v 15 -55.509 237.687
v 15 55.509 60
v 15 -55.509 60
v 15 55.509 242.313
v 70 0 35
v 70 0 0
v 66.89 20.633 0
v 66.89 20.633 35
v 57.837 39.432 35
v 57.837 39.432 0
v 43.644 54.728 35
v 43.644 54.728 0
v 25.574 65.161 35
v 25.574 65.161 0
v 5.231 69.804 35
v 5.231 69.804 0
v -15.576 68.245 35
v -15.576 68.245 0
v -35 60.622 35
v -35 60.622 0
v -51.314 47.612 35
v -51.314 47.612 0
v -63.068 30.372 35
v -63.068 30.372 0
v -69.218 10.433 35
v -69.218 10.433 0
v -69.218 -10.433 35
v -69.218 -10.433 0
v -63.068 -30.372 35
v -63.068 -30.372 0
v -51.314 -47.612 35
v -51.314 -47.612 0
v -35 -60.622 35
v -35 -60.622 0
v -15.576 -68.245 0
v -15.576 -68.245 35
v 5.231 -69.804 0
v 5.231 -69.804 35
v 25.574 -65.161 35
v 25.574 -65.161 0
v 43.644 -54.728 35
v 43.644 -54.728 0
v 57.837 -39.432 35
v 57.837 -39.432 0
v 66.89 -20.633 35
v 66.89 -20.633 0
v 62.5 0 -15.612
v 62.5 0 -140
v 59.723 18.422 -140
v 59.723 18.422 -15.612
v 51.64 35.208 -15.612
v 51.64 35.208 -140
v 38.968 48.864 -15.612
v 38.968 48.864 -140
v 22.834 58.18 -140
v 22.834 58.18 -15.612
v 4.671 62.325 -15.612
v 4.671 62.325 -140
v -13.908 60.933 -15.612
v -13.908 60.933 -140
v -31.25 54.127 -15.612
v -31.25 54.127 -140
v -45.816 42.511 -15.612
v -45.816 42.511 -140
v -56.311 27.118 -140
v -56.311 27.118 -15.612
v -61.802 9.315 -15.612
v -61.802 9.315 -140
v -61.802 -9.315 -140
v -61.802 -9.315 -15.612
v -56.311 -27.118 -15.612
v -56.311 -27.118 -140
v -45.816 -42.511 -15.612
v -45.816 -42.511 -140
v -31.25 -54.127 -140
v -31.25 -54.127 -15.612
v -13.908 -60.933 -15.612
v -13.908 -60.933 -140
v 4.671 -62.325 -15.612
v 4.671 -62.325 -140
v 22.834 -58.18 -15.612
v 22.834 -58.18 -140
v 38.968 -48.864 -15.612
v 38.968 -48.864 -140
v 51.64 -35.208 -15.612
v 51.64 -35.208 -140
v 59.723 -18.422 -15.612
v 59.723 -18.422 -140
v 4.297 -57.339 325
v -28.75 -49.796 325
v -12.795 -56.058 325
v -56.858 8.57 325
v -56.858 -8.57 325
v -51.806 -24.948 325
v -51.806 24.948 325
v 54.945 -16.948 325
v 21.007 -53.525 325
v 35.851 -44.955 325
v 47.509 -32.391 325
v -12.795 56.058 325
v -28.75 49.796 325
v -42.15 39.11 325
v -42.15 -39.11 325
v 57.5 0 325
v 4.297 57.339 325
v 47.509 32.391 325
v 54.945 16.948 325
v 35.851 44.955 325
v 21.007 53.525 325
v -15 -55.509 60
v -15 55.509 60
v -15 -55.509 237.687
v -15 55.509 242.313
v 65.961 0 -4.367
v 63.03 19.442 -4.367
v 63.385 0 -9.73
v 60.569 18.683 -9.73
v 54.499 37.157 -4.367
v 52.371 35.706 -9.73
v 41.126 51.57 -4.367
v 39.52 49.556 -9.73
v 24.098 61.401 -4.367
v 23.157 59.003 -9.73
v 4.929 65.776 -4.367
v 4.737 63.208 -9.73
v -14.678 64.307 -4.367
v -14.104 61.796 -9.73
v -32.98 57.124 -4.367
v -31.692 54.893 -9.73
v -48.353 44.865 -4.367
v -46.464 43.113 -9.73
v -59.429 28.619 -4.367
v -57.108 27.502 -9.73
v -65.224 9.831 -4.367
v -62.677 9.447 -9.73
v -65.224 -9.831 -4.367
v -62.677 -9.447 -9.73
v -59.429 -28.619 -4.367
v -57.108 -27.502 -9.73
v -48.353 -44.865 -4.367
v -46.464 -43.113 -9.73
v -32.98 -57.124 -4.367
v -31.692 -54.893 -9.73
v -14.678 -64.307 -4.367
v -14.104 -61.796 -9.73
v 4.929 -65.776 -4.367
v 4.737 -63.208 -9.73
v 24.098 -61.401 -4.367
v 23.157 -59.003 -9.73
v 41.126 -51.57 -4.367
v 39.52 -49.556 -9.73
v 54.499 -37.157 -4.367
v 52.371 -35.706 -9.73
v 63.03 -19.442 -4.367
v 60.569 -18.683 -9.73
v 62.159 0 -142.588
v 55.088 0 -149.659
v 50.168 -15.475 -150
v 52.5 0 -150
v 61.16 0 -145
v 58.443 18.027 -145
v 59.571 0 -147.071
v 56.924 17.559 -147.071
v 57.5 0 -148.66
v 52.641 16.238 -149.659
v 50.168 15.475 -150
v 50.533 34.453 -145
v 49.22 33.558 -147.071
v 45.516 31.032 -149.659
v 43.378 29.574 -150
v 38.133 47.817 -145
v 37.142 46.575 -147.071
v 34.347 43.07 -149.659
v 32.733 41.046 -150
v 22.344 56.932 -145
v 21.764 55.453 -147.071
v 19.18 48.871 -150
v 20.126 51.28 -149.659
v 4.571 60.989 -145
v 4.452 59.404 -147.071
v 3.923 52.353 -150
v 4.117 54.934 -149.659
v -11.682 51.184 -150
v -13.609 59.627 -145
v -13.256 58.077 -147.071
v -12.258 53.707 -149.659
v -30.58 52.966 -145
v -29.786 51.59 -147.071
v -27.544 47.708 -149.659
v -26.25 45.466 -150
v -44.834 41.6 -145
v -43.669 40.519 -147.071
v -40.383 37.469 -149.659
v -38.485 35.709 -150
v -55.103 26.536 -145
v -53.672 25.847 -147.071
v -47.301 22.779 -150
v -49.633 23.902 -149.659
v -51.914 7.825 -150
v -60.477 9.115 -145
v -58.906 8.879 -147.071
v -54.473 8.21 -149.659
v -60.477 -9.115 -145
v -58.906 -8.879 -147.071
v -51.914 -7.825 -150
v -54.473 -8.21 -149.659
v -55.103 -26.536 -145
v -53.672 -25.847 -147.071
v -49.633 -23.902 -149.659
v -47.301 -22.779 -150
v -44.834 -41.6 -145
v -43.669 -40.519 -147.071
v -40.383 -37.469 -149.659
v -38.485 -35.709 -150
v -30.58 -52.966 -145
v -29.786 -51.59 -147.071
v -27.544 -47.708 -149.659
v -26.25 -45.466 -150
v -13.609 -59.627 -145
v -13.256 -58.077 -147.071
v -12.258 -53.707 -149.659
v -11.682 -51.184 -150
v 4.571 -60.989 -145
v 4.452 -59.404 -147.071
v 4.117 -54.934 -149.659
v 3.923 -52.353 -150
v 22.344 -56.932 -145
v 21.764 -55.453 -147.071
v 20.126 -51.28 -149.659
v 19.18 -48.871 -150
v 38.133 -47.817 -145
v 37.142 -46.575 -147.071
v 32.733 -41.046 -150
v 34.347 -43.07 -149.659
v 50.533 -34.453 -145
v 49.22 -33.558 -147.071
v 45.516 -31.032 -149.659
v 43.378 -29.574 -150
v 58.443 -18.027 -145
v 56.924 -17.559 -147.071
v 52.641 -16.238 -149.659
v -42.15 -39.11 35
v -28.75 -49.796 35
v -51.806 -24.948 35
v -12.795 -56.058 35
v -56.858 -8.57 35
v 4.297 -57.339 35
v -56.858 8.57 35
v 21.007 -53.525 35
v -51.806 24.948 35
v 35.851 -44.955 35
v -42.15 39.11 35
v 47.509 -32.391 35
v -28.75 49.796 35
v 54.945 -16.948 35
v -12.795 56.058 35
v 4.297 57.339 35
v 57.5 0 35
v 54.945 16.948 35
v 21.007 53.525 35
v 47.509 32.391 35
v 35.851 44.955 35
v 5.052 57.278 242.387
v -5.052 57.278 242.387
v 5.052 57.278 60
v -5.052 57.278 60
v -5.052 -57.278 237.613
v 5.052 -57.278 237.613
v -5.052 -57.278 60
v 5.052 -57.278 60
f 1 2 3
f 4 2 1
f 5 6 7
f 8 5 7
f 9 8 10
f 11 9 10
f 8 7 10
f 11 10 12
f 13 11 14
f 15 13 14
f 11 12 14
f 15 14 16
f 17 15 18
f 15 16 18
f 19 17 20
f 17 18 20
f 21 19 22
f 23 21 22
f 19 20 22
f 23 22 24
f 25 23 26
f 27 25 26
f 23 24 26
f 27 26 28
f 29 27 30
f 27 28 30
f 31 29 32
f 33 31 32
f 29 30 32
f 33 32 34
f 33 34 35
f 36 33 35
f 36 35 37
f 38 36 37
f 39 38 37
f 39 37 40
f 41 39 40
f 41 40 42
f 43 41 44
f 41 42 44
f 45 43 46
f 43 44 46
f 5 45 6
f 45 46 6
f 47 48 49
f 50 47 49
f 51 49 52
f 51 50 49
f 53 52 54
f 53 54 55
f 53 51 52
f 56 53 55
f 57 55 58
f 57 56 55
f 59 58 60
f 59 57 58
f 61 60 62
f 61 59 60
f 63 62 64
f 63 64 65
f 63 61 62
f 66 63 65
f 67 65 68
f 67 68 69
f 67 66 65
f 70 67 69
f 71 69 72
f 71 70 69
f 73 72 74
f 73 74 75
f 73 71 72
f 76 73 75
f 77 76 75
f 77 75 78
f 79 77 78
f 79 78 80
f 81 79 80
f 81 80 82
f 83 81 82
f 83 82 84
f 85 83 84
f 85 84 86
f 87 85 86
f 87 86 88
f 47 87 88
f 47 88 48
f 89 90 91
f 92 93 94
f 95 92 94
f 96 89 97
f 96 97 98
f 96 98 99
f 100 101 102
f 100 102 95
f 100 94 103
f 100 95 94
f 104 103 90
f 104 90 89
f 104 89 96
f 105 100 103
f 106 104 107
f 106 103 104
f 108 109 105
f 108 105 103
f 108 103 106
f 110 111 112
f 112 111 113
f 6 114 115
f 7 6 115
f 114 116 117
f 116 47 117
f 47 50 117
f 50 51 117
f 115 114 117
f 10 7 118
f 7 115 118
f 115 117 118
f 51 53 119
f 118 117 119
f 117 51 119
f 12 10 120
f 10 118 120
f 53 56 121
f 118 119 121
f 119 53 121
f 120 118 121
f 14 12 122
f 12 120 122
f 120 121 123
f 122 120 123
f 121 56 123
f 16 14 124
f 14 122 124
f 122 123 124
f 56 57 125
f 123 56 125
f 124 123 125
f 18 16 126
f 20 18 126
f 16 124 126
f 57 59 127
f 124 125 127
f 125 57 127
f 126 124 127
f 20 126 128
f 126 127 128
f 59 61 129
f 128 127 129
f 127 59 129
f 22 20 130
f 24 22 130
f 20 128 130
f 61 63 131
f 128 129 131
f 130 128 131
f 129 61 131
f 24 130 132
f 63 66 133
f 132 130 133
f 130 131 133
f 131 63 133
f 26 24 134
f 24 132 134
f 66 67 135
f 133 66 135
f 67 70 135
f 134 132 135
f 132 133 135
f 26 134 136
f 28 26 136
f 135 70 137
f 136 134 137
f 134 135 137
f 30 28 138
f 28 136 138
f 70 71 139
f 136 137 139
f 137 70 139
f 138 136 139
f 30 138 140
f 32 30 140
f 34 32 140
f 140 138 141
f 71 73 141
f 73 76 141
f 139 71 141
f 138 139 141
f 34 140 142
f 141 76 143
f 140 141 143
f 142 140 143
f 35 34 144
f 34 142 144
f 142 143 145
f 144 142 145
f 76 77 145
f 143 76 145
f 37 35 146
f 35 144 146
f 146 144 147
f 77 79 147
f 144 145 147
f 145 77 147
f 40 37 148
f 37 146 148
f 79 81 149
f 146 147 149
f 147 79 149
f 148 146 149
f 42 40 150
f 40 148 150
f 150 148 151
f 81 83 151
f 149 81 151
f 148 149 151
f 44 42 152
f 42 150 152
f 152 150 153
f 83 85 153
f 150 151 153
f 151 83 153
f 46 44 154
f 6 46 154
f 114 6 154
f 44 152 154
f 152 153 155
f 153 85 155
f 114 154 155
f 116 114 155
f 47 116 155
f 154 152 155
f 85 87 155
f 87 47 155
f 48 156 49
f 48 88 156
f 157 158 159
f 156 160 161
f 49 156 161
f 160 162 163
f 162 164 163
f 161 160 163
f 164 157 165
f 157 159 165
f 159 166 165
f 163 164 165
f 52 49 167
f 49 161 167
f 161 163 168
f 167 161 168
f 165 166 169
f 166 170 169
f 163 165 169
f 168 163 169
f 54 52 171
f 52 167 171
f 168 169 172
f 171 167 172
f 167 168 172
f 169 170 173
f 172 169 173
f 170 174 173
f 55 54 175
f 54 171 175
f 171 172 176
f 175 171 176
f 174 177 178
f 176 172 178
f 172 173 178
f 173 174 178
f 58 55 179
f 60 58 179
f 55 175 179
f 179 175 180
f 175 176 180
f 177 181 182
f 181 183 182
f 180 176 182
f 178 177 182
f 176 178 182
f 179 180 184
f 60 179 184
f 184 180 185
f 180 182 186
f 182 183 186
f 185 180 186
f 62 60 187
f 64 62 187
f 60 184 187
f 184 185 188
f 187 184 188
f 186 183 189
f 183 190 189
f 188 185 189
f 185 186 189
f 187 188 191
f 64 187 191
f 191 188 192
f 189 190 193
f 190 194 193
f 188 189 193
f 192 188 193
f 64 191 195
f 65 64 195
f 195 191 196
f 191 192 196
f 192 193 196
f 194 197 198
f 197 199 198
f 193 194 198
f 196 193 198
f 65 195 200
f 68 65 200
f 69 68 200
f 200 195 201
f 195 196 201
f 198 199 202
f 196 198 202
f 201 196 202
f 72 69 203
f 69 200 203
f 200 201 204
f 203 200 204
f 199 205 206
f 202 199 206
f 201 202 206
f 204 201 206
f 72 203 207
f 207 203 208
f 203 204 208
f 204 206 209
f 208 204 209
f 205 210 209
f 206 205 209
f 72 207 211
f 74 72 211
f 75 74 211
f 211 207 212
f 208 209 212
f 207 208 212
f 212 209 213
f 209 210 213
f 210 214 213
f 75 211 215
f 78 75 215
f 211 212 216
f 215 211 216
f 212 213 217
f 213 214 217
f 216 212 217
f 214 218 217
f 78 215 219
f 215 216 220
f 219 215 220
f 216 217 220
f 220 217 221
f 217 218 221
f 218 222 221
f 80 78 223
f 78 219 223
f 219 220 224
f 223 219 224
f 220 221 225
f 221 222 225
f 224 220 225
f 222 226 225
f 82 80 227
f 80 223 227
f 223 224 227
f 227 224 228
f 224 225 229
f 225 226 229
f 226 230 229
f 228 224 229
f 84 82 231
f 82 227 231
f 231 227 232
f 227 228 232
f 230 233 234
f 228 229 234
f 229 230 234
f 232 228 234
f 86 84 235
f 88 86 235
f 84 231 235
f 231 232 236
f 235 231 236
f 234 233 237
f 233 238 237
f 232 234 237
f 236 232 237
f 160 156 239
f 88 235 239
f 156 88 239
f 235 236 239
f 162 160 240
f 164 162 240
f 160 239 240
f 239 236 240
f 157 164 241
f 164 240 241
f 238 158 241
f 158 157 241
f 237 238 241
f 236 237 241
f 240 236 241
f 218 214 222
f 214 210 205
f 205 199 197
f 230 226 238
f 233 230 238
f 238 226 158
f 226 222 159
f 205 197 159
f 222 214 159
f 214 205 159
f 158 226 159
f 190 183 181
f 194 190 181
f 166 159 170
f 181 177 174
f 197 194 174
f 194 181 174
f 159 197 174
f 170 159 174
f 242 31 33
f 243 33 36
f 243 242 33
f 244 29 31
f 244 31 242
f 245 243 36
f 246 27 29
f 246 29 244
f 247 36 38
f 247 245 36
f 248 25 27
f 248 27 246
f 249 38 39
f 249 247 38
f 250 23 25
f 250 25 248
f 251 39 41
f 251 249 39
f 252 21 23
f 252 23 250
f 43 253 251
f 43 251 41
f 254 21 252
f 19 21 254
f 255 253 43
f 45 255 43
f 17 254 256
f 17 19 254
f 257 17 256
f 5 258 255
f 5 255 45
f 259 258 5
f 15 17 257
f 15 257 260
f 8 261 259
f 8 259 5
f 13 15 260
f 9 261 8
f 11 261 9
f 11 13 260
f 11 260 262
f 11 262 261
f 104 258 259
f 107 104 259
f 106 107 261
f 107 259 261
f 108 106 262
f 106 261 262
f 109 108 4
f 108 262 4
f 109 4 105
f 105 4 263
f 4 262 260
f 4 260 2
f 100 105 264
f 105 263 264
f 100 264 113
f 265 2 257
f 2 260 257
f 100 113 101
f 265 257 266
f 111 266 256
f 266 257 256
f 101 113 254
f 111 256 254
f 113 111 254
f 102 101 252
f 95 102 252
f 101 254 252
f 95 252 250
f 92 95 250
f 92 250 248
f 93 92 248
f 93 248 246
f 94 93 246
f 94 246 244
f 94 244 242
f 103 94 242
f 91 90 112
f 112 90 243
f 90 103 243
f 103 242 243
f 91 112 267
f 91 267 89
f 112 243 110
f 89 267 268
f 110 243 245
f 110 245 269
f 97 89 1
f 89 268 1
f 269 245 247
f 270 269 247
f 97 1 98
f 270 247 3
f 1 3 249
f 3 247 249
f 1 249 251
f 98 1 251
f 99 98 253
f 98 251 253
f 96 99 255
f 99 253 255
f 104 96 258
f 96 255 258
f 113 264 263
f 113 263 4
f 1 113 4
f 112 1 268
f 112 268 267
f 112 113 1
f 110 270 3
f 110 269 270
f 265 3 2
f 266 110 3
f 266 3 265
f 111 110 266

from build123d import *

# Parameters (mm, degrees)
SKETCH1_R               = 70
BOSS_EXTRUDE1_DEPTH     = 35
SKETCH2_R               = 62.5
BOSS_EXTRUDE2_DEPTH     = 150
FILLET1_R               = 20
SKETCH3_R               = 57.5
BOSS_EXTRUDE3_DEPTH     = 325
CUT_EXTRUDE1_DEPTH      = 15
CUT_EXTRUDE1_DEPTH_BACK = 15
FILLET2_R               = 10


with BuildPart() as part:
    # Sketch1 → Boss-Extrude1 (new body)
    with BuildSketch(Plane.XY):
        Circle(SKETCH1_R)
    extrude(amount=BOSS_EXTRUDE1_DEPTH)

    # Sketch2 → Boss-Extrude2 (add)
    with BuildSketch(Plane.XY):
        Circle(SKETCH2_R)
    extrude(amount=-BOSS_EXTRUDE2_DEPTH)

    # Fillet1
    # the kernel refuses this fillet: 20 mm, written as the material it adds along each edge
    with BuildSketch(Plane(origin=(0, 0, 0), x_dir=(1, 0, 0), z_dir=(0, -1, 0))) as fillet1_piece_1:
        with BuildLine():
            CenterArc((82.5, -15.612494996), FILLET1_R, 128.682187453, 51.317812547)
            Line((62.5, -15.612494996), (62.1, -15.612494996))
            Line((62.1, -15.612494996), (62.1, 0))
            Line((62.1, 0), (62.5, 0.4))
            ThreePointArc((62.5, 0.4), (66.25, 0.4), (69.75, 0.3122499))
            Line((69.75, 0.3122499), (70, 0))
        make_face()
    revolve(axis=Axis((0, 0, 0), (0, 0, 1)))

    # Sketch3 → Boss-Extrude3 (add)
    with BuildSketch(Plane.XY):
        Circle(SKETCH3_R)
    extrude(amount=BOSS_EXTRUDE3_DEPTH)

    # Sketch4 → Cut-Extrude1 (cut, two sides: drawn at the far end of the back side and taken through both)
    with BuildSketch(Plane(origin=(0, 0, 0), x_dir=(0, 0, -1), z_dir=(1, 0, 0)).offset(-CUT_EXTRUDE1_DEPTH_BACK)):
        Polygon((-240, 0), (-251.375, 273), (-60, 273), (-60, 0), (-60, -273), (-228.625, -273), align=None)
    extrude(amount=CUT_EXTRUDE1_DEPTH + CUT_EXTRUDE1_DEPTH_BACK, mode=Mode.SUBTRACT)

    # Fillet2
    fillet2_edges = [part.edges().sort_by_distance(p)[0] for p in [
        (-62.5, 0, -150),
    ]]
    fillet(fillet2_edges, radius=FILLET2_R)


solid = part.part
